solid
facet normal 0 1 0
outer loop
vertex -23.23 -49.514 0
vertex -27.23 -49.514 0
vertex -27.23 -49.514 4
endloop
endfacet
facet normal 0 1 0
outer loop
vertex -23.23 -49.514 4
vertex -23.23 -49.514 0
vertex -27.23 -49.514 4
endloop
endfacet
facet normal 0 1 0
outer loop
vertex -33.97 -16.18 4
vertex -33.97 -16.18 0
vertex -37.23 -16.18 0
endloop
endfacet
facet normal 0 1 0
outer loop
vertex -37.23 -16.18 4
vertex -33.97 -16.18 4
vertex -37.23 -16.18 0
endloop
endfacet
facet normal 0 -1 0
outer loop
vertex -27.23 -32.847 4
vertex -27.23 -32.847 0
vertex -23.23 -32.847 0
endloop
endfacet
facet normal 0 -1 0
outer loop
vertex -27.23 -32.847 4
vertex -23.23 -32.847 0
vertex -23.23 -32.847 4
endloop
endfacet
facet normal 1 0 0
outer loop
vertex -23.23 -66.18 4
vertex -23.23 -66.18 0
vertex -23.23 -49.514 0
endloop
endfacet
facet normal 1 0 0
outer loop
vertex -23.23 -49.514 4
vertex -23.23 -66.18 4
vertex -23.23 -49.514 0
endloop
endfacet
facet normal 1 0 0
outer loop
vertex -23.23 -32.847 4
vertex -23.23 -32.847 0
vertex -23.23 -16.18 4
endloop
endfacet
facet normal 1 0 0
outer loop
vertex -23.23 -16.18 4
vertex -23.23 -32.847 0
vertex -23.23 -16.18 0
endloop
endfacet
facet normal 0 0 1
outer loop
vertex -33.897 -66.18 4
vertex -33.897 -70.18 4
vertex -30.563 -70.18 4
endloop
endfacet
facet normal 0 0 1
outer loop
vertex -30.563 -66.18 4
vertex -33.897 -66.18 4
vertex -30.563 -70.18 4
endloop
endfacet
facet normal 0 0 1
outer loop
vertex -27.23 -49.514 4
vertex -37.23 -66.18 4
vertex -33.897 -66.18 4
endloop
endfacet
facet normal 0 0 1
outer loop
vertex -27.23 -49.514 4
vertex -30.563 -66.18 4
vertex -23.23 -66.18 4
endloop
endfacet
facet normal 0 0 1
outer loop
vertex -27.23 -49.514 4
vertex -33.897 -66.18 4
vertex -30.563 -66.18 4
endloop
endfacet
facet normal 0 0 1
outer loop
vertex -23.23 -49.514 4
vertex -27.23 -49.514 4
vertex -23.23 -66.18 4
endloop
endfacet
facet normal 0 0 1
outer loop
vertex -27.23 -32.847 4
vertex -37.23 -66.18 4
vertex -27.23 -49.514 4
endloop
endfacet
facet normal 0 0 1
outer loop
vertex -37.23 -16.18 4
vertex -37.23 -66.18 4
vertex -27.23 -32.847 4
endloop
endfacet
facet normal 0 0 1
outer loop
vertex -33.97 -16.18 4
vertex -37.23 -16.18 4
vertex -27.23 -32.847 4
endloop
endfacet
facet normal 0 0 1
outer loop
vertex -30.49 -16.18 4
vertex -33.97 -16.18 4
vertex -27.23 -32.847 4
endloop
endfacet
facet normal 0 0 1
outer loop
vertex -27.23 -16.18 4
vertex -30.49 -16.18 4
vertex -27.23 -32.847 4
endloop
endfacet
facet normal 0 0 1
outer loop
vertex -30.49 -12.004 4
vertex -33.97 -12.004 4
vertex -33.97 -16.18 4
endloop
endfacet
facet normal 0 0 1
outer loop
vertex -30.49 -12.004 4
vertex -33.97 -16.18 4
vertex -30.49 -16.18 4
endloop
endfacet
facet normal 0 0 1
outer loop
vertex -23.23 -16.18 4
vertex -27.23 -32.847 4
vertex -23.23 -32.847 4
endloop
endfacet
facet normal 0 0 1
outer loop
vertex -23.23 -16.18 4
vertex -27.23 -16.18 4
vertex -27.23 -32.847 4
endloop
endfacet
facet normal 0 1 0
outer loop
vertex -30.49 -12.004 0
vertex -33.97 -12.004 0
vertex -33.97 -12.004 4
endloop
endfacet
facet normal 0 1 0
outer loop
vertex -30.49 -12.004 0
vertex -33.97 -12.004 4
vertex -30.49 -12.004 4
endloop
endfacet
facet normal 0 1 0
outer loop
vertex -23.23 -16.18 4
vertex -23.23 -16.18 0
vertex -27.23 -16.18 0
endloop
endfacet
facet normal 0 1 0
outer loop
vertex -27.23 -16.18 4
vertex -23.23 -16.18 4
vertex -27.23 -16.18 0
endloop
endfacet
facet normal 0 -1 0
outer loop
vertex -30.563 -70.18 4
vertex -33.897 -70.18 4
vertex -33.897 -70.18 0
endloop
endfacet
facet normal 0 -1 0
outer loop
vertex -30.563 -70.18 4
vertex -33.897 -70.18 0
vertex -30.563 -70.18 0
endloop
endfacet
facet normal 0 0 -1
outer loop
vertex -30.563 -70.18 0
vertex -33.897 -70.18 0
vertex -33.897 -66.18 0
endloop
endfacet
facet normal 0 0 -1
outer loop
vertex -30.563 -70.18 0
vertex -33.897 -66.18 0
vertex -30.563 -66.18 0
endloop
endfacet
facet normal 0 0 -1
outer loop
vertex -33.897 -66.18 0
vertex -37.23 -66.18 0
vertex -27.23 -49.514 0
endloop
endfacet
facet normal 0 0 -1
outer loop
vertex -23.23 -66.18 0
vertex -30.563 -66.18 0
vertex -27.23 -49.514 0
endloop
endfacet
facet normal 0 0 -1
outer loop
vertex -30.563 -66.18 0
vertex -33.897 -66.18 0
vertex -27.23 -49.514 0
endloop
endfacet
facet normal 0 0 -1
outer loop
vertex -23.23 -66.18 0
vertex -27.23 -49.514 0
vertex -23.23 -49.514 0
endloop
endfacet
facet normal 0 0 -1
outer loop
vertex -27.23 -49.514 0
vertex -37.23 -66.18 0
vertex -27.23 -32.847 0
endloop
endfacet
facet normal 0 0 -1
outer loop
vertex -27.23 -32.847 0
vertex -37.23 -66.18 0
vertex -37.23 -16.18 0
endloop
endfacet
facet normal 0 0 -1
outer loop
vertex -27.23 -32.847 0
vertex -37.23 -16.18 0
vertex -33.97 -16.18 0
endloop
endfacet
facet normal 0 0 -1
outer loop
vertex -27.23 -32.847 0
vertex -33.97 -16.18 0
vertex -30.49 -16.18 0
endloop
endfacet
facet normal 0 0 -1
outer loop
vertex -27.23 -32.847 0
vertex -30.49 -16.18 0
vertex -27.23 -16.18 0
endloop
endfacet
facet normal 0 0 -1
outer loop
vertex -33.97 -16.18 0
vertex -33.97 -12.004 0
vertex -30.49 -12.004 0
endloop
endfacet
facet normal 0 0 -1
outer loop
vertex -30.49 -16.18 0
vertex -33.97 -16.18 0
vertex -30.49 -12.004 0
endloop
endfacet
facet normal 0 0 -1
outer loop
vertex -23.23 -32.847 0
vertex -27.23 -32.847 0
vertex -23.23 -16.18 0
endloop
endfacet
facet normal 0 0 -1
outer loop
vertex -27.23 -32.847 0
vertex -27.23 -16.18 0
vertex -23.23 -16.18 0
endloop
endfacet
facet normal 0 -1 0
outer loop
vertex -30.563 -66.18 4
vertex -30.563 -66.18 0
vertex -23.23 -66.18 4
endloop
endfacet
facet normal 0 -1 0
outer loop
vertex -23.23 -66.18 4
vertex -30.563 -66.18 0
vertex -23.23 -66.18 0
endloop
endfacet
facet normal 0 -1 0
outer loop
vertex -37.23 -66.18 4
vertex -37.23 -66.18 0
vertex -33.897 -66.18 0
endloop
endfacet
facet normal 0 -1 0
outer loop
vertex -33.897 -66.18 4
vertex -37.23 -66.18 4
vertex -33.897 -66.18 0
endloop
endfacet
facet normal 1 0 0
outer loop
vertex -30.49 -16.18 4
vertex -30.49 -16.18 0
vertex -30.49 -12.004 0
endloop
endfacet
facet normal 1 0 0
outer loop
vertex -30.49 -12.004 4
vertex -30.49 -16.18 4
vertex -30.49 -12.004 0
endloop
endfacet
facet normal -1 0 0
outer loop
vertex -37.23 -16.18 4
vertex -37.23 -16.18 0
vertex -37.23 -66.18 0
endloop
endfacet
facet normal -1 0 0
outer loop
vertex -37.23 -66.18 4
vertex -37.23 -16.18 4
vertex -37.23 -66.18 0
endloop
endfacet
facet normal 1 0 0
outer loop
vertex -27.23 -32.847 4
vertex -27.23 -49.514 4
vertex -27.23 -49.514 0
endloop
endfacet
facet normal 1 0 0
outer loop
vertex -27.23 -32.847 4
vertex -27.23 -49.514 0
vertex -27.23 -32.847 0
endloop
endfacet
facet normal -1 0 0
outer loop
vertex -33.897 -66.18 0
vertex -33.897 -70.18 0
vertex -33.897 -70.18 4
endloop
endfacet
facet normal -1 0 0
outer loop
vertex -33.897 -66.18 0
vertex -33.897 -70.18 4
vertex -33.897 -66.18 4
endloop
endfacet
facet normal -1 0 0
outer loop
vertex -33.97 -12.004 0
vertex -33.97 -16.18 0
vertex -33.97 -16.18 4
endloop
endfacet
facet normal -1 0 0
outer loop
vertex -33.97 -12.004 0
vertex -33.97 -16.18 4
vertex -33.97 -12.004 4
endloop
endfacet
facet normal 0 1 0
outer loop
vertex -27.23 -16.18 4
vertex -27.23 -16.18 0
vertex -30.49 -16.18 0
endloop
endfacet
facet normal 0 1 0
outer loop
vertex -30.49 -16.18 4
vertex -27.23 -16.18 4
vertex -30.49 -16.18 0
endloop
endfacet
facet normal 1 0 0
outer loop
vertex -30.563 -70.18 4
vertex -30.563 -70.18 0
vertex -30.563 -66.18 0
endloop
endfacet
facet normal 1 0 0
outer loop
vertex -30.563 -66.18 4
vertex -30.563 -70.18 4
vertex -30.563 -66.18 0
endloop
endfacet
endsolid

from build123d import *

# Parameters (mm, degrees)
SKETCH1_W           = 3.479672363
SKETCH1_H           = 4.175606835
SKETCH1_W_2         = 3.333333333
SKETCH1_H_2         = 4
BOSS_EXTRUDE1_DEPTH = 4
CAVITY1_START       = -27.230031218
CAVITY1_OUTLINE_W   = 16.666666667
CAVITY1_OUTLINE_H   = 4
CAVITY1_DEPTH       = 4


# Read off the part's stored shape, not the designer's step: Cavity1
with BuildPart() as part:
    # Sketch1 → Boss-Extrude1 (new body)
    with BuildSketch(Plane.XY):
        with Locations((-32.230031219, -14.092199994)):
            Rectangle(SKETCH1_W, SKETCH1_H)
        Polygon((-33.9698674, -20.355610246), (-33.9698674, -16.180003411), (-37.230031218, -16.180003411), (-37.230031218, -66.180003411), (-33.896697885, -66.180003411), (-33.896697885, -62.180003411), (-30.563364552, -62.180003411), (-30.563364552, -66.180003411), (-27.230031218, -66.180003411), (-27.230031218, -16.180003411), (-30.490195037, -16.180003411), (-30.490195037, -20.355610246), align=None)
        with Locations((-32.230031219, -18.267806828)):
            Rectangle(SKETCH1_W, SKETCH1_H)
        Polygon((-23.230031218, -16.180335931), (-27.230031218, -16.180003411), (-27.230031218, -66.180003411), (-23.230031218, -66.180003411), align=None)
        with Locations((-32.230031219, -64.180003411)):
            Rectangle(SKETCH1_W_2, SKETCH1_H_2)
        with Locations((-32.230031219, -68.180003411)):
            Rectangle(SKETCH1_W_2, SKETCH1_H_2)
    extrude(amount=BOSS_EXTRUDE1_DEPTH)

    # Cavity1 outline → Cavity1 (cut)
    with BuildSketch(Plane.YZ.offset(CAVITY1_START)):
        with Locations((-41.180335932, 2)):
            Rectangle(CAVITY1_OUTLINE_W, CAVITY1_OUTLINE_H)
    extrude(amount=CAVITY1_DEPTH, mode=Mode.SUBTRACT)


solid = part.part
